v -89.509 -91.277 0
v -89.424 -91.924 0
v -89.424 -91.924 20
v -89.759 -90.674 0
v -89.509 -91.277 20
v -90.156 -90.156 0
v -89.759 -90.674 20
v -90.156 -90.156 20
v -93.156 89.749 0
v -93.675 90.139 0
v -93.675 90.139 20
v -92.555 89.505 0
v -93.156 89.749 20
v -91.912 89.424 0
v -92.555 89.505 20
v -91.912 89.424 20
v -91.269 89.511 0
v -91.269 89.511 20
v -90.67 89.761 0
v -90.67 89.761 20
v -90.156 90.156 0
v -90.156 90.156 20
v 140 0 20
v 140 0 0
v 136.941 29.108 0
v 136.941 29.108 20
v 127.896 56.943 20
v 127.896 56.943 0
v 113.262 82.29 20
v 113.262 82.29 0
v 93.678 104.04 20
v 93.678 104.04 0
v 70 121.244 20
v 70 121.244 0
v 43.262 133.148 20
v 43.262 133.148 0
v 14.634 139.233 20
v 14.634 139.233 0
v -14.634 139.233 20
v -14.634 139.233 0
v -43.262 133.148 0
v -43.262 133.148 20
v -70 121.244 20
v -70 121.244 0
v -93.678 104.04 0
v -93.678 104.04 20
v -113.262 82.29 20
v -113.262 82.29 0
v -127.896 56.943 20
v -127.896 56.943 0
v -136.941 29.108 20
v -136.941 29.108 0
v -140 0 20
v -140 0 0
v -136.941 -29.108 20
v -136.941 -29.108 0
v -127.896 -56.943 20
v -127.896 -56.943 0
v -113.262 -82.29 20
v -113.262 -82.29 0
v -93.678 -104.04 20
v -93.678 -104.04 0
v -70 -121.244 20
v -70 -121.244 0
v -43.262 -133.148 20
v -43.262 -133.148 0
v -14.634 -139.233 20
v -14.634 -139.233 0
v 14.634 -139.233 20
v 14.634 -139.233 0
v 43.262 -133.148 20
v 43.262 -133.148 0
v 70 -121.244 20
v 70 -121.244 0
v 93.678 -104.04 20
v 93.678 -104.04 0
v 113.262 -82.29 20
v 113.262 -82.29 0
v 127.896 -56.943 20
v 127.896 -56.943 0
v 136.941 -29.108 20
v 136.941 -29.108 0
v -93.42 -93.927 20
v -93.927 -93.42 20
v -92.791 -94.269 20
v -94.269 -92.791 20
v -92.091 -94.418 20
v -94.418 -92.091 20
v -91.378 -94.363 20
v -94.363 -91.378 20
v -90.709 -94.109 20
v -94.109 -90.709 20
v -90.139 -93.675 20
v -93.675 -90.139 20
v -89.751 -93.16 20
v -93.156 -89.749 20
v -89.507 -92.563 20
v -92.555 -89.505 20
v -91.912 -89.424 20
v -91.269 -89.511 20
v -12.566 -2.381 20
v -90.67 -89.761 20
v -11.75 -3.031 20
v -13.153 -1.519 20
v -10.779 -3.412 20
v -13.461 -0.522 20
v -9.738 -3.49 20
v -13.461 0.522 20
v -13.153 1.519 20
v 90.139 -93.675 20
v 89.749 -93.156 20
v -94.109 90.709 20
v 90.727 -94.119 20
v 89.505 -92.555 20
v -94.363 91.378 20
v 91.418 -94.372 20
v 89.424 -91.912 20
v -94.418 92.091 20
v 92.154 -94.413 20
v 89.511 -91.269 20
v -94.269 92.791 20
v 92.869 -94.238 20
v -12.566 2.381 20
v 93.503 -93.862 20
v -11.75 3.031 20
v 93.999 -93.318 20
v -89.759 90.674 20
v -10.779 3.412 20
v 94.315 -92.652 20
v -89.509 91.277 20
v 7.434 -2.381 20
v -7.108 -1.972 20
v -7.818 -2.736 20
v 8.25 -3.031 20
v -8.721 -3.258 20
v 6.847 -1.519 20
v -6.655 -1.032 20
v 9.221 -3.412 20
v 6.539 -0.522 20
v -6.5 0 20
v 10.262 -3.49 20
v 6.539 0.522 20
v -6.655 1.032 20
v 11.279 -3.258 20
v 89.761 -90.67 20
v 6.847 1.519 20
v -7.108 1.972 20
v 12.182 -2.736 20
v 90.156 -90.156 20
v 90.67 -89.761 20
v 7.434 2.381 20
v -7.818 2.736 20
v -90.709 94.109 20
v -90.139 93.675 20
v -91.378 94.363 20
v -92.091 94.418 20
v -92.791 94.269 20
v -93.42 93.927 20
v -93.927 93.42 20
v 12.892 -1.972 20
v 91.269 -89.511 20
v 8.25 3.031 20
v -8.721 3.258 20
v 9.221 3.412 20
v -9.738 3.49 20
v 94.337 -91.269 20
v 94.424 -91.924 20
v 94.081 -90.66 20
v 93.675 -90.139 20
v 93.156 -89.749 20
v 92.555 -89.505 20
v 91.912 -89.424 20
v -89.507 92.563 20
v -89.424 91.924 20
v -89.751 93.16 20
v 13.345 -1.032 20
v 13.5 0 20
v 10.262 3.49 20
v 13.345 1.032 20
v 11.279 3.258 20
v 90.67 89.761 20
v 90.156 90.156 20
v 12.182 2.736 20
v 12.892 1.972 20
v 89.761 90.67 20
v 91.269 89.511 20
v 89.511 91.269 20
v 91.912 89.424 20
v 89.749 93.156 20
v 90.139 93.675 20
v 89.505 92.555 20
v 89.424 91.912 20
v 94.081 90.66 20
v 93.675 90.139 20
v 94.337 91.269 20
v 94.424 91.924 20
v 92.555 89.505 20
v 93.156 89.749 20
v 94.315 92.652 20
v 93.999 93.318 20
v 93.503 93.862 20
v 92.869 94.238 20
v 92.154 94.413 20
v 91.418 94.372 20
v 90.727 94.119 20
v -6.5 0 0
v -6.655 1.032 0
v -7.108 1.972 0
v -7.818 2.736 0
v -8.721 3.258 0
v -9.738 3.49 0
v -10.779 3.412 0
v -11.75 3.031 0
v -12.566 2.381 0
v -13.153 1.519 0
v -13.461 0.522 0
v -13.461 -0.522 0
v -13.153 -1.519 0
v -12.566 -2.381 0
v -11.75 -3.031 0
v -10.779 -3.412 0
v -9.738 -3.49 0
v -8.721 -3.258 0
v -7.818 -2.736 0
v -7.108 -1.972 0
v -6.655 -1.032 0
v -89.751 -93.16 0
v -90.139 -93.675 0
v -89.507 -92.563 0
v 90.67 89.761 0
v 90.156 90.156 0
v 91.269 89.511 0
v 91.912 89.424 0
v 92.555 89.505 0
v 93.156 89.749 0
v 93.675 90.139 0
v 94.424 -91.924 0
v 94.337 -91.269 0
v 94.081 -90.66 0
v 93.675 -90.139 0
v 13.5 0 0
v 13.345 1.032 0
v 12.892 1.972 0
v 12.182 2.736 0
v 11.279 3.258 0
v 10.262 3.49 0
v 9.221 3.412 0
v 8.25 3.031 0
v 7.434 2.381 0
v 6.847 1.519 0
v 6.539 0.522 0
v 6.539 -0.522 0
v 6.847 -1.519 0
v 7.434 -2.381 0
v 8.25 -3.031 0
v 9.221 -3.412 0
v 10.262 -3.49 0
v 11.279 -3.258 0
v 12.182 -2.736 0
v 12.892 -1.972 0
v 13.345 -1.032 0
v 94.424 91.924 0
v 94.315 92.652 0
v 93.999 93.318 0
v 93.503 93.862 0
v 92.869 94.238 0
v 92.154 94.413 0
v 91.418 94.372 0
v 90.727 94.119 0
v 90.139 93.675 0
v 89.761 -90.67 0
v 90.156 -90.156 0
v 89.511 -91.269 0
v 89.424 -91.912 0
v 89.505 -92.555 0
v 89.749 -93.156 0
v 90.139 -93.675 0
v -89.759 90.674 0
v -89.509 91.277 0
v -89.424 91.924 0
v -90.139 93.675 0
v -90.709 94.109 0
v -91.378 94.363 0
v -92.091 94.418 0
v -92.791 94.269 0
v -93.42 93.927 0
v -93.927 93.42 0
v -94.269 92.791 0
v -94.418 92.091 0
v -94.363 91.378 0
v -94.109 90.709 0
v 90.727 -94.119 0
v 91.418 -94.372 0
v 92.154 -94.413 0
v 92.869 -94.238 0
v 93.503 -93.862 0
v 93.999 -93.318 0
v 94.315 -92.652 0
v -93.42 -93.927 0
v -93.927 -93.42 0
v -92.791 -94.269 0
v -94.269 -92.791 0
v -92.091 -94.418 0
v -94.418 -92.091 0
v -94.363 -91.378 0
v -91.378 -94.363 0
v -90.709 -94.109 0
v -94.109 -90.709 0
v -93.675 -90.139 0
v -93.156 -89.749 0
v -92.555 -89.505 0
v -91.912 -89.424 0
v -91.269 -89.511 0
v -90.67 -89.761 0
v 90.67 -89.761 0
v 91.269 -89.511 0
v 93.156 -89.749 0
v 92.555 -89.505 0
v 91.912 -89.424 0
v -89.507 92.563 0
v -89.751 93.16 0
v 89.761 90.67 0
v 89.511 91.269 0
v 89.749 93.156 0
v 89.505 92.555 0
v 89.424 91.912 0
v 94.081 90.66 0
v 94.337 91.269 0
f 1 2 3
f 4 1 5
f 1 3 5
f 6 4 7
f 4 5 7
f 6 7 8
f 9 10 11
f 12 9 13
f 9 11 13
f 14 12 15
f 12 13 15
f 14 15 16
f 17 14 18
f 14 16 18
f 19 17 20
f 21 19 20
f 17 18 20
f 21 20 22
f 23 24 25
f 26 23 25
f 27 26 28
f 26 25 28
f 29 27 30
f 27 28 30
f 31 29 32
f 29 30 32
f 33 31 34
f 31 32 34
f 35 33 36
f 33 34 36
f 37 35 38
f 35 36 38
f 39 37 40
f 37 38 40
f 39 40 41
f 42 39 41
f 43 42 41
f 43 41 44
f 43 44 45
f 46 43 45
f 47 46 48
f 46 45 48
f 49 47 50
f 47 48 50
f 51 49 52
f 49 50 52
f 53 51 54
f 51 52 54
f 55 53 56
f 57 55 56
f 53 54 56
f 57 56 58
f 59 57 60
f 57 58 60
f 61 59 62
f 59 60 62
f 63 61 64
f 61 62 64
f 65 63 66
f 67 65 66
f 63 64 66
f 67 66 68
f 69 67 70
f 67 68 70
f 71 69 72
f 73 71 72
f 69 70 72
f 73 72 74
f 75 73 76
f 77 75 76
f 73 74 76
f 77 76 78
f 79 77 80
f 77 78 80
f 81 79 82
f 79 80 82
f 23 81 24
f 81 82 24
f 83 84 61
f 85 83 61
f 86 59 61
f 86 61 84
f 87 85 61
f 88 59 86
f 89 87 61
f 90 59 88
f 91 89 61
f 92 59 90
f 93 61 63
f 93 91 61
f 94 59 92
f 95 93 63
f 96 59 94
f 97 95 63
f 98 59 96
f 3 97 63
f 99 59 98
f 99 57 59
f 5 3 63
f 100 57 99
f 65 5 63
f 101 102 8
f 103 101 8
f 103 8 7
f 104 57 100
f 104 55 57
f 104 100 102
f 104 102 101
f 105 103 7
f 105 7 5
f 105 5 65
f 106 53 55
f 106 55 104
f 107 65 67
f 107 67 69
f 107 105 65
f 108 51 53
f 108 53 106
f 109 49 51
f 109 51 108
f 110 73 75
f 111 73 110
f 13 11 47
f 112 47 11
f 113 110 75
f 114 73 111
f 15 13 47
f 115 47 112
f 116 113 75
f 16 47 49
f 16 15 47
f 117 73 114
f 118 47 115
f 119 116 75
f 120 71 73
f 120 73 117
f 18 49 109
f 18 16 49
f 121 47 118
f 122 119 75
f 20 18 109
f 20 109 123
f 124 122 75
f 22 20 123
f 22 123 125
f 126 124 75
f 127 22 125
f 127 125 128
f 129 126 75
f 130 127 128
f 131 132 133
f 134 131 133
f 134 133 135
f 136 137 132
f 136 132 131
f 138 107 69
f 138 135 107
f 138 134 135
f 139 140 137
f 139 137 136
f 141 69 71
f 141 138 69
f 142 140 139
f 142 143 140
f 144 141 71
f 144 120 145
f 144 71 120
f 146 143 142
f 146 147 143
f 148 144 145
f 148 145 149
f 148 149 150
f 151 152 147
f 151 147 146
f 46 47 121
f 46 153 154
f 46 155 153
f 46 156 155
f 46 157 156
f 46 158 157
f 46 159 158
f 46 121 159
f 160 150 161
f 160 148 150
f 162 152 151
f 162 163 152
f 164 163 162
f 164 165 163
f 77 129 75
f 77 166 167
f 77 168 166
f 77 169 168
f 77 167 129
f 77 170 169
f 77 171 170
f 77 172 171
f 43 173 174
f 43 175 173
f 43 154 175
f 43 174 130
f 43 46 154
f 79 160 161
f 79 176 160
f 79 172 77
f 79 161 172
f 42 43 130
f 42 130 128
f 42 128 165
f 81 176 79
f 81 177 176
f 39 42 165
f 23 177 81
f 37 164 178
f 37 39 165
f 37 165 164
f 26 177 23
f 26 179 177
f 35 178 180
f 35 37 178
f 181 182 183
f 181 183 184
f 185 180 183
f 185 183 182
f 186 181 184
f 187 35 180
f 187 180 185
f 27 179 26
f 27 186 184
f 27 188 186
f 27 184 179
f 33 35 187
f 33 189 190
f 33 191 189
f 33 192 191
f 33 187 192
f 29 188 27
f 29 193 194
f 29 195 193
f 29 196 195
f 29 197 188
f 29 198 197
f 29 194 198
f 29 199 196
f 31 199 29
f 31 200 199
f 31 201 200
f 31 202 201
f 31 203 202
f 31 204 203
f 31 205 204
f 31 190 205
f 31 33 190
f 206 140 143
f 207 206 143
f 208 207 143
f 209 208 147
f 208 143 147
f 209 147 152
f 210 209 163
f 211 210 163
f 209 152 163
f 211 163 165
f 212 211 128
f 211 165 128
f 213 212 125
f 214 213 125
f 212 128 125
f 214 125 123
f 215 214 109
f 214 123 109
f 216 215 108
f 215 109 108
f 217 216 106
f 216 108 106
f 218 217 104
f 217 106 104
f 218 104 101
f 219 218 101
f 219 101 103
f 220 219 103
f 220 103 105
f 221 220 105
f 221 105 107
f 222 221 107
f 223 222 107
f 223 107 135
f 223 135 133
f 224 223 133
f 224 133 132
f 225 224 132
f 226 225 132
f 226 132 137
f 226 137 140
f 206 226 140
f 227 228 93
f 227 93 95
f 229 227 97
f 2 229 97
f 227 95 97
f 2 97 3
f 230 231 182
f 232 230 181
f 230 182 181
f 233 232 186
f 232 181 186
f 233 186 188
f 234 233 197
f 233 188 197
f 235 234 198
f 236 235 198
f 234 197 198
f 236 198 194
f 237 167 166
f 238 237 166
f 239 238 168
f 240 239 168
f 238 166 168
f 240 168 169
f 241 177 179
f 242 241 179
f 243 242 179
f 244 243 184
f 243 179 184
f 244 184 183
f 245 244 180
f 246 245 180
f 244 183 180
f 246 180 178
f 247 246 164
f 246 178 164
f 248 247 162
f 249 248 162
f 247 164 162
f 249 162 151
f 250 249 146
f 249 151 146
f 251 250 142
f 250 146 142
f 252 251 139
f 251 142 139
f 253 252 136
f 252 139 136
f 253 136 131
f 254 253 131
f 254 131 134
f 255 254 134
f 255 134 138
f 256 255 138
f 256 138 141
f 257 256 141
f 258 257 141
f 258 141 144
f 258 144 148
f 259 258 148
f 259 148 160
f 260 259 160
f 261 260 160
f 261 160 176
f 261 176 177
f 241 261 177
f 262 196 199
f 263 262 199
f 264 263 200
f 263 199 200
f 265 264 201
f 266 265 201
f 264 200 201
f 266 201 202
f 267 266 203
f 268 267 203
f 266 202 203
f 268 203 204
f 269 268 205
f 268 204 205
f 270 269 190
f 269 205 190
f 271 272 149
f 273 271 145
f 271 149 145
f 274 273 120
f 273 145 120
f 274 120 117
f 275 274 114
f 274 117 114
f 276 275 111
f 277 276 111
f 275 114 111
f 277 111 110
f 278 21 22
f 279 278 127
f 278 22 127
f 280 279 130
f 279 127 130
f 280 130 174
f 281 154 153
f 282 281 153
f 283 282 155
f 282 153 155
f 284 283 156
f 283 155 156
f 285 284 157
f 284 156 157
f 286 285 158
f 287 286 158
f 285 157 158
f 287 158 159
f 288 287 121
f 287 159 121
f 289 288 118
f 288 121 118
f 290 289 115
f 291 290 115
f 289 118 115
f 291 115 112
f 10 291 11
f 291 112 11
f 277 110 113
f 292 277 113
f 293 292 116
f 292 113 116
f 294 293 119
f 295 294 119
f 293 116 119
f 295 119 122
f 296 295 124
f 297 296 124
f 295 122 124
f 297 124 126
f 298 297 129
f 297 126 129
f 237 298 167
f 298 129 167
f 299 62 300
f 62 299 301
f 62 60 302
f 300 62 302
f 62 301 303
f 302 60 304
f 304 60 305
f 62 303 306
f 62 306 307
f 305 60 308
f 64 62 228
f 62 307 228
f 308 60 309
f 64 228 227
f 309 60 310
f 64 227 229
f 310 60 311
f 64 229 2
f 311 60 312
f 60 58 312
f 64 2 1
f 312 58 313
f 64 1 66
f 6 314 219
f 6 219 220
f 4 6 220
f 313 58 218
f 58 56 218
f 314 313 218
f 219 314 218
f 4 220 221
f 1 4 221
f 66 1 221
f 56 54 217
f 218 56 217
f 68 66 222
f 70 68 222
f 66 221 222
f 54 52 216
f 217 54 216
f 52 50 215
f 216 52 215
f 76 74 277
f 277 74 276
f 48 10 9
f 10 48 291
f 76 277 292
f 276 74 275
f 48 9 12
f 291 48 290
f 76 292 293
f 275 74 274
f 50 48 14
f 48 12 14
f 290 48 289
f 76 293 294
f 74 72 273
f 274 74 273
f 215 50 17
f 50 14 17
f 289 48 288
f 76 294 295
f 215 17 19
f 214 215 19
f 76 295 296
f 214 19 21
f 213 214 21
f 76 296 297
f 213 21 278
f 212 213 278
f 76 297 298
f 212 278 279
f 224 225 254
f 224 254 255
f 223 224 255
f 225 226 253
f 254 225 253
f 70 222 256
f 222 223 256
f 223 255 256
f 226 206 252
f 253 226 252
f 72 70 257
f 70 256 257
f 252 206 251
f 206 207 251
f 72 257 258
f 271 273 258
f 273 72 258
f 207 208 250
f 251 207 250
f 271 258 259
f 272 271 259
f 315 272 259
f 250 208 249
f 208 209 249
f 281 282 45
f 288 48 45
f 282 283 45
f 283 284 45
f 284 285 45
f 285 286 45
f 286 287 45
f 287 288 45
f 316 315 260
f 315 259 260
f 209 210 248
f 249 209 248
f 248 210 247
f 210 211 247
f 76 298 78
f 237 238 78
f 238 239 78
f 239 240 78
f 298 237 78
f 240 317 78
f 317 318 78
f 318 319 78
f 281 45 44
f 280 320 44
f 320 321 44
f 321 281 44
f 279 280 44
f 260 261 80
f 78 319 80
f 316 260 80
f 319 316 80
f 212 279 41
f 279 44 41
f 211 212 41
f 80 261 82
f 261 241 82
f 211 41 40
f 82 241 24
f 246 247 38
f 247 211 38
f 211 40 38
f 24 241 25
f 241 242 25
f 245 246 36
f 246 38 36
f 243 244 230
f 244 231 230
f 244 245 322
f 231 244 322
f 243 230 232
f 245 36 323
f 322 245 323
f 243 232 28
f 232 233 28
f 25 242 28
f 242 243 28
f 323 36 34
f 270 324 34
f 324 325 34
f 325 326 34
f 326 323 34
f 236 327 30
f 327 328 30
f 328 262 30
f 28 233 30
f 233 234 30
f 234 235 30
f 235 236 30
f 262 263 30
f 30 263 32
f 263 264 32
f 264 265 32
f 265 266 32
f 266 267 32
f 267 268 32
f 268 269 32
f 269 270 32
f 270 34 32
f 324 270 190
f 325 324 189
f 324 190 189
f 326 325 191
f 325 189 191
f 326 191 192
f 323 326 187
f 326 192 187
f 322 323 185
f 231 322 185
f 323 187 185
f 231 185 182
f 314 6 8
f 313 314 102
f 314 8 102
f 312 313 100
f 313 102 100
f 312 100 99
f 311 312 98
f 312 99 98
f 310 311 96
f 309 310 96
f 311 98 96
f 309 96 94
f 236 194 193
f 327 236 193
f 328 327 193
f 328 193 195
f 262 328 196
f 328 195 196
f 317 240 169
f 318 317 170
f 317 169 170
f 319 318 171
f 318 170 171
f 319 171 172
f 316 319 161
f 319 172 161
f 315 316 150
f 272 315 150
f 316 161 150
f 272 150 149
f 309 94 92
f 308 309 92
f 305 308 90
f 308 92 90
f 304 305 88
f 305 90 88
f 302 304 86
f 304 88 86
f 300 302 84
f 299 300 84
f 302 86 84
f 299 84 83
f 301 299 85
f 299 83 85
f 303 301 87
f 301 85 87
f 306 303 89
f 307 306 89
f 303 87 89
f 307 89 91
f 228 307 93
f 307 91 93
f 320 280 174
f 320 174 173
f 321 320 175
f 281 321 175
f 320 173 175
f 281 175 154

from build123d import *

# Parameters (mm, degrees)
F0_R     = 140
F1_DEPTH = 20
F2_R     = 3.5
F3_DEPTH = 20.001
F5_DEPTH = 25


with BuildPart() as f1:
    # F0 (on Top) → F1 (new body)
    with BuildSketch(Plane.XY):
        Circle(F0_R)
    extrude(amount=F1_DEPTH)

    # F2 (on face) → F3 (cut, through all)
    with BuildSketch(Plane.XY.offset(20)):
        with Locations((-10, 0)):
            Circle(F2_R)
        with Locations((10, 0)):
            Circle(F2_R)
    extrude(amount=-F3_DEPTH, mode=Mode.SUBTRACT)

    # F4 (on face) → F5 (cut)
    with BuildSketch(Plane.XY.offset(20)):
        with BuildLine():
            ThreePointArc((-91.923882, 91.923882), (-91.035749, 92.803515), (-90.139199, 93.674569))
            ThreePointArc((-90.139199, 93.674569), (-93.691649, 93.691649), (-93.674569, 90.139199))
            ThreePointArc((-93.674569, 90.139199), (-92.803515, 91.035749), (-91.923882, 91.923882))
        make_face()
        with BuildLine():
            ThreePointArc((-89.423882, 91.923882), (-89.60961, 92.869475), (-90.139199, 93.674569))
            ThreePointArc((-90.139199, 93.674569), (-91.035749, 92.803515), (-91.923882, 91.923882))
            Line((-91.923882, 91.923882), (-90.156115, 90.156115))
            ThreePointArc((-90.156115, 90.156115), (-89.614183, 90.967173), (-89.423882, 91.923882))
        make_face()
        with BuildLine():
            ThreePointArc((-93.674569, 90.139199), (-91.911862, 89.42391), (-90.156115, 90.156115))
            Line((-90.156115, 90.156115), (-91.923882, 91.923882))
            ThreePointArc((-91.923882, 91.923882), (-92.803515, 91.035749), (-93.674569, 90.139199))
        make_face()
        with BuildLine():
            ThreePointArc((91.923882, 91.923882), (92.803515, 91.035749), (93.674569, 90.139199))
            ThreePointArc((93.674569, 90.139199), (94.228954, 90.95608), (94.423882, 91.923882))
            ThreePointArc((94.423882, 91.923882), (92.869475, 94.238153), (90.139199, 93.674569))
            ThreePointArc((90.139199, 93.674569), (91.035749, 92.803515), (91.923882, 91.923882))
        make_face()
        with BuildLine():
            Line((90.156115, 90.156115), (91.923882, 91.923882))
            ThreePointArc((91.923882, 91.923882), (91.035749, 92.803515), (90.139199, 93.674569))
            ThreePointArc((90.139199, 93.674569), (89.42391, 91.911862), (90.156115, 90.156115))
        make_face()
        with BuildLine():
            ThreePointArc((90.156115, 90.156115), (91.911862, 89.42391), (93.674569, 90.139199))
            ThreePointArc((93.674569, 90.139199), (92.803515, 91.035749), (91.923882, 91.923882))
            Line((91.923882, 91.923882), (90.156115, 90.156115))
        make_face()
        with BuildLine():
            ThreePointArc((-93.674569, -90.139199), (-93.691649, -93.691649), (-90.139199, -93.674569))
            ThreePointArc((-90.139199, -93.674569), (-91.035749, -92.803515), (-91.923882, -91.923882))
            ThreePointArc((-91.923882, -91.923882), (-92.803515, -91.035749), (-93.674569, -90.139199))
        make_face()
        with BuildLine():
            ThreePointArc((-89.423882, -91.923882), (-89.614183, -90.967173), (-90.156115, -90.156115))
            Line((-90.156115, -90.156115), (-91.923882, -91.923882))
            ThreePointArc((-91.923882, -91.923882), (-91.035749, -92.803515), (-90.139199, -93.674569))
            ThreePointArc((-90.139199, -93.674569), (-89.60961, -92.869475), (-89.423882, -91.923882))
        make_face()
        with BuildLine():
            Line((-91.923882, -91.923882), (-90.156115, -90.156115))
            ThreePointArc((-90.156115, -90.156115), (-91.911862, -89.42391), (-93.674569, -90.139199))
            ThreePointArc((-93.674569, -90.139199), (-92.803515, -91.035749), (-91.923882, -91.923882))
        make_face()
        with BuildLine():
            ThreePointArc((94.423882, -91.923882), (94.228954, -90.95608), (93.674569, -90.139199))
            ThreePointArc((93.674569, -90.139199), (92.803515, -91.035749), (91.923882, -91.923882))
            ThreePointArc((91.923882, -91.923882), (91.035749, -92.803515), (90.139199, -93.674569))
            ThreePointArc((90.139199, -93.674569), (92.869475, -94.238153), (94.423882, -91.923882))
        make_face()
        with BuildLine():
            ThreePointArc((90.139199, -93.674569), (91.035749, -92.803515), (91.923882, -91.923882))
            Line((91.923882, -91.923882), (90.156115, -90.156115))
            ThreePointArc((90.156115, -90.156115), (89.42391, -91.911862), (90.139199, -93.674569))
        make_face()
        with BuildLine():
            ThreePointArc((91.923882, -91.923882), (92.803515, -91.035749), (93.674569, -90.139199))
            ThreePointArc((93.674569, -90.139199), (91.911862, -89.42391), (90.156115, -90.156115))
            Line((90.156115, -90.156115), (91.923882, -91.923882))
        make_face()
    extrude(amount=-F5_DEPTH, mode=Mode.SUBTRACT)


solid = f1.part
